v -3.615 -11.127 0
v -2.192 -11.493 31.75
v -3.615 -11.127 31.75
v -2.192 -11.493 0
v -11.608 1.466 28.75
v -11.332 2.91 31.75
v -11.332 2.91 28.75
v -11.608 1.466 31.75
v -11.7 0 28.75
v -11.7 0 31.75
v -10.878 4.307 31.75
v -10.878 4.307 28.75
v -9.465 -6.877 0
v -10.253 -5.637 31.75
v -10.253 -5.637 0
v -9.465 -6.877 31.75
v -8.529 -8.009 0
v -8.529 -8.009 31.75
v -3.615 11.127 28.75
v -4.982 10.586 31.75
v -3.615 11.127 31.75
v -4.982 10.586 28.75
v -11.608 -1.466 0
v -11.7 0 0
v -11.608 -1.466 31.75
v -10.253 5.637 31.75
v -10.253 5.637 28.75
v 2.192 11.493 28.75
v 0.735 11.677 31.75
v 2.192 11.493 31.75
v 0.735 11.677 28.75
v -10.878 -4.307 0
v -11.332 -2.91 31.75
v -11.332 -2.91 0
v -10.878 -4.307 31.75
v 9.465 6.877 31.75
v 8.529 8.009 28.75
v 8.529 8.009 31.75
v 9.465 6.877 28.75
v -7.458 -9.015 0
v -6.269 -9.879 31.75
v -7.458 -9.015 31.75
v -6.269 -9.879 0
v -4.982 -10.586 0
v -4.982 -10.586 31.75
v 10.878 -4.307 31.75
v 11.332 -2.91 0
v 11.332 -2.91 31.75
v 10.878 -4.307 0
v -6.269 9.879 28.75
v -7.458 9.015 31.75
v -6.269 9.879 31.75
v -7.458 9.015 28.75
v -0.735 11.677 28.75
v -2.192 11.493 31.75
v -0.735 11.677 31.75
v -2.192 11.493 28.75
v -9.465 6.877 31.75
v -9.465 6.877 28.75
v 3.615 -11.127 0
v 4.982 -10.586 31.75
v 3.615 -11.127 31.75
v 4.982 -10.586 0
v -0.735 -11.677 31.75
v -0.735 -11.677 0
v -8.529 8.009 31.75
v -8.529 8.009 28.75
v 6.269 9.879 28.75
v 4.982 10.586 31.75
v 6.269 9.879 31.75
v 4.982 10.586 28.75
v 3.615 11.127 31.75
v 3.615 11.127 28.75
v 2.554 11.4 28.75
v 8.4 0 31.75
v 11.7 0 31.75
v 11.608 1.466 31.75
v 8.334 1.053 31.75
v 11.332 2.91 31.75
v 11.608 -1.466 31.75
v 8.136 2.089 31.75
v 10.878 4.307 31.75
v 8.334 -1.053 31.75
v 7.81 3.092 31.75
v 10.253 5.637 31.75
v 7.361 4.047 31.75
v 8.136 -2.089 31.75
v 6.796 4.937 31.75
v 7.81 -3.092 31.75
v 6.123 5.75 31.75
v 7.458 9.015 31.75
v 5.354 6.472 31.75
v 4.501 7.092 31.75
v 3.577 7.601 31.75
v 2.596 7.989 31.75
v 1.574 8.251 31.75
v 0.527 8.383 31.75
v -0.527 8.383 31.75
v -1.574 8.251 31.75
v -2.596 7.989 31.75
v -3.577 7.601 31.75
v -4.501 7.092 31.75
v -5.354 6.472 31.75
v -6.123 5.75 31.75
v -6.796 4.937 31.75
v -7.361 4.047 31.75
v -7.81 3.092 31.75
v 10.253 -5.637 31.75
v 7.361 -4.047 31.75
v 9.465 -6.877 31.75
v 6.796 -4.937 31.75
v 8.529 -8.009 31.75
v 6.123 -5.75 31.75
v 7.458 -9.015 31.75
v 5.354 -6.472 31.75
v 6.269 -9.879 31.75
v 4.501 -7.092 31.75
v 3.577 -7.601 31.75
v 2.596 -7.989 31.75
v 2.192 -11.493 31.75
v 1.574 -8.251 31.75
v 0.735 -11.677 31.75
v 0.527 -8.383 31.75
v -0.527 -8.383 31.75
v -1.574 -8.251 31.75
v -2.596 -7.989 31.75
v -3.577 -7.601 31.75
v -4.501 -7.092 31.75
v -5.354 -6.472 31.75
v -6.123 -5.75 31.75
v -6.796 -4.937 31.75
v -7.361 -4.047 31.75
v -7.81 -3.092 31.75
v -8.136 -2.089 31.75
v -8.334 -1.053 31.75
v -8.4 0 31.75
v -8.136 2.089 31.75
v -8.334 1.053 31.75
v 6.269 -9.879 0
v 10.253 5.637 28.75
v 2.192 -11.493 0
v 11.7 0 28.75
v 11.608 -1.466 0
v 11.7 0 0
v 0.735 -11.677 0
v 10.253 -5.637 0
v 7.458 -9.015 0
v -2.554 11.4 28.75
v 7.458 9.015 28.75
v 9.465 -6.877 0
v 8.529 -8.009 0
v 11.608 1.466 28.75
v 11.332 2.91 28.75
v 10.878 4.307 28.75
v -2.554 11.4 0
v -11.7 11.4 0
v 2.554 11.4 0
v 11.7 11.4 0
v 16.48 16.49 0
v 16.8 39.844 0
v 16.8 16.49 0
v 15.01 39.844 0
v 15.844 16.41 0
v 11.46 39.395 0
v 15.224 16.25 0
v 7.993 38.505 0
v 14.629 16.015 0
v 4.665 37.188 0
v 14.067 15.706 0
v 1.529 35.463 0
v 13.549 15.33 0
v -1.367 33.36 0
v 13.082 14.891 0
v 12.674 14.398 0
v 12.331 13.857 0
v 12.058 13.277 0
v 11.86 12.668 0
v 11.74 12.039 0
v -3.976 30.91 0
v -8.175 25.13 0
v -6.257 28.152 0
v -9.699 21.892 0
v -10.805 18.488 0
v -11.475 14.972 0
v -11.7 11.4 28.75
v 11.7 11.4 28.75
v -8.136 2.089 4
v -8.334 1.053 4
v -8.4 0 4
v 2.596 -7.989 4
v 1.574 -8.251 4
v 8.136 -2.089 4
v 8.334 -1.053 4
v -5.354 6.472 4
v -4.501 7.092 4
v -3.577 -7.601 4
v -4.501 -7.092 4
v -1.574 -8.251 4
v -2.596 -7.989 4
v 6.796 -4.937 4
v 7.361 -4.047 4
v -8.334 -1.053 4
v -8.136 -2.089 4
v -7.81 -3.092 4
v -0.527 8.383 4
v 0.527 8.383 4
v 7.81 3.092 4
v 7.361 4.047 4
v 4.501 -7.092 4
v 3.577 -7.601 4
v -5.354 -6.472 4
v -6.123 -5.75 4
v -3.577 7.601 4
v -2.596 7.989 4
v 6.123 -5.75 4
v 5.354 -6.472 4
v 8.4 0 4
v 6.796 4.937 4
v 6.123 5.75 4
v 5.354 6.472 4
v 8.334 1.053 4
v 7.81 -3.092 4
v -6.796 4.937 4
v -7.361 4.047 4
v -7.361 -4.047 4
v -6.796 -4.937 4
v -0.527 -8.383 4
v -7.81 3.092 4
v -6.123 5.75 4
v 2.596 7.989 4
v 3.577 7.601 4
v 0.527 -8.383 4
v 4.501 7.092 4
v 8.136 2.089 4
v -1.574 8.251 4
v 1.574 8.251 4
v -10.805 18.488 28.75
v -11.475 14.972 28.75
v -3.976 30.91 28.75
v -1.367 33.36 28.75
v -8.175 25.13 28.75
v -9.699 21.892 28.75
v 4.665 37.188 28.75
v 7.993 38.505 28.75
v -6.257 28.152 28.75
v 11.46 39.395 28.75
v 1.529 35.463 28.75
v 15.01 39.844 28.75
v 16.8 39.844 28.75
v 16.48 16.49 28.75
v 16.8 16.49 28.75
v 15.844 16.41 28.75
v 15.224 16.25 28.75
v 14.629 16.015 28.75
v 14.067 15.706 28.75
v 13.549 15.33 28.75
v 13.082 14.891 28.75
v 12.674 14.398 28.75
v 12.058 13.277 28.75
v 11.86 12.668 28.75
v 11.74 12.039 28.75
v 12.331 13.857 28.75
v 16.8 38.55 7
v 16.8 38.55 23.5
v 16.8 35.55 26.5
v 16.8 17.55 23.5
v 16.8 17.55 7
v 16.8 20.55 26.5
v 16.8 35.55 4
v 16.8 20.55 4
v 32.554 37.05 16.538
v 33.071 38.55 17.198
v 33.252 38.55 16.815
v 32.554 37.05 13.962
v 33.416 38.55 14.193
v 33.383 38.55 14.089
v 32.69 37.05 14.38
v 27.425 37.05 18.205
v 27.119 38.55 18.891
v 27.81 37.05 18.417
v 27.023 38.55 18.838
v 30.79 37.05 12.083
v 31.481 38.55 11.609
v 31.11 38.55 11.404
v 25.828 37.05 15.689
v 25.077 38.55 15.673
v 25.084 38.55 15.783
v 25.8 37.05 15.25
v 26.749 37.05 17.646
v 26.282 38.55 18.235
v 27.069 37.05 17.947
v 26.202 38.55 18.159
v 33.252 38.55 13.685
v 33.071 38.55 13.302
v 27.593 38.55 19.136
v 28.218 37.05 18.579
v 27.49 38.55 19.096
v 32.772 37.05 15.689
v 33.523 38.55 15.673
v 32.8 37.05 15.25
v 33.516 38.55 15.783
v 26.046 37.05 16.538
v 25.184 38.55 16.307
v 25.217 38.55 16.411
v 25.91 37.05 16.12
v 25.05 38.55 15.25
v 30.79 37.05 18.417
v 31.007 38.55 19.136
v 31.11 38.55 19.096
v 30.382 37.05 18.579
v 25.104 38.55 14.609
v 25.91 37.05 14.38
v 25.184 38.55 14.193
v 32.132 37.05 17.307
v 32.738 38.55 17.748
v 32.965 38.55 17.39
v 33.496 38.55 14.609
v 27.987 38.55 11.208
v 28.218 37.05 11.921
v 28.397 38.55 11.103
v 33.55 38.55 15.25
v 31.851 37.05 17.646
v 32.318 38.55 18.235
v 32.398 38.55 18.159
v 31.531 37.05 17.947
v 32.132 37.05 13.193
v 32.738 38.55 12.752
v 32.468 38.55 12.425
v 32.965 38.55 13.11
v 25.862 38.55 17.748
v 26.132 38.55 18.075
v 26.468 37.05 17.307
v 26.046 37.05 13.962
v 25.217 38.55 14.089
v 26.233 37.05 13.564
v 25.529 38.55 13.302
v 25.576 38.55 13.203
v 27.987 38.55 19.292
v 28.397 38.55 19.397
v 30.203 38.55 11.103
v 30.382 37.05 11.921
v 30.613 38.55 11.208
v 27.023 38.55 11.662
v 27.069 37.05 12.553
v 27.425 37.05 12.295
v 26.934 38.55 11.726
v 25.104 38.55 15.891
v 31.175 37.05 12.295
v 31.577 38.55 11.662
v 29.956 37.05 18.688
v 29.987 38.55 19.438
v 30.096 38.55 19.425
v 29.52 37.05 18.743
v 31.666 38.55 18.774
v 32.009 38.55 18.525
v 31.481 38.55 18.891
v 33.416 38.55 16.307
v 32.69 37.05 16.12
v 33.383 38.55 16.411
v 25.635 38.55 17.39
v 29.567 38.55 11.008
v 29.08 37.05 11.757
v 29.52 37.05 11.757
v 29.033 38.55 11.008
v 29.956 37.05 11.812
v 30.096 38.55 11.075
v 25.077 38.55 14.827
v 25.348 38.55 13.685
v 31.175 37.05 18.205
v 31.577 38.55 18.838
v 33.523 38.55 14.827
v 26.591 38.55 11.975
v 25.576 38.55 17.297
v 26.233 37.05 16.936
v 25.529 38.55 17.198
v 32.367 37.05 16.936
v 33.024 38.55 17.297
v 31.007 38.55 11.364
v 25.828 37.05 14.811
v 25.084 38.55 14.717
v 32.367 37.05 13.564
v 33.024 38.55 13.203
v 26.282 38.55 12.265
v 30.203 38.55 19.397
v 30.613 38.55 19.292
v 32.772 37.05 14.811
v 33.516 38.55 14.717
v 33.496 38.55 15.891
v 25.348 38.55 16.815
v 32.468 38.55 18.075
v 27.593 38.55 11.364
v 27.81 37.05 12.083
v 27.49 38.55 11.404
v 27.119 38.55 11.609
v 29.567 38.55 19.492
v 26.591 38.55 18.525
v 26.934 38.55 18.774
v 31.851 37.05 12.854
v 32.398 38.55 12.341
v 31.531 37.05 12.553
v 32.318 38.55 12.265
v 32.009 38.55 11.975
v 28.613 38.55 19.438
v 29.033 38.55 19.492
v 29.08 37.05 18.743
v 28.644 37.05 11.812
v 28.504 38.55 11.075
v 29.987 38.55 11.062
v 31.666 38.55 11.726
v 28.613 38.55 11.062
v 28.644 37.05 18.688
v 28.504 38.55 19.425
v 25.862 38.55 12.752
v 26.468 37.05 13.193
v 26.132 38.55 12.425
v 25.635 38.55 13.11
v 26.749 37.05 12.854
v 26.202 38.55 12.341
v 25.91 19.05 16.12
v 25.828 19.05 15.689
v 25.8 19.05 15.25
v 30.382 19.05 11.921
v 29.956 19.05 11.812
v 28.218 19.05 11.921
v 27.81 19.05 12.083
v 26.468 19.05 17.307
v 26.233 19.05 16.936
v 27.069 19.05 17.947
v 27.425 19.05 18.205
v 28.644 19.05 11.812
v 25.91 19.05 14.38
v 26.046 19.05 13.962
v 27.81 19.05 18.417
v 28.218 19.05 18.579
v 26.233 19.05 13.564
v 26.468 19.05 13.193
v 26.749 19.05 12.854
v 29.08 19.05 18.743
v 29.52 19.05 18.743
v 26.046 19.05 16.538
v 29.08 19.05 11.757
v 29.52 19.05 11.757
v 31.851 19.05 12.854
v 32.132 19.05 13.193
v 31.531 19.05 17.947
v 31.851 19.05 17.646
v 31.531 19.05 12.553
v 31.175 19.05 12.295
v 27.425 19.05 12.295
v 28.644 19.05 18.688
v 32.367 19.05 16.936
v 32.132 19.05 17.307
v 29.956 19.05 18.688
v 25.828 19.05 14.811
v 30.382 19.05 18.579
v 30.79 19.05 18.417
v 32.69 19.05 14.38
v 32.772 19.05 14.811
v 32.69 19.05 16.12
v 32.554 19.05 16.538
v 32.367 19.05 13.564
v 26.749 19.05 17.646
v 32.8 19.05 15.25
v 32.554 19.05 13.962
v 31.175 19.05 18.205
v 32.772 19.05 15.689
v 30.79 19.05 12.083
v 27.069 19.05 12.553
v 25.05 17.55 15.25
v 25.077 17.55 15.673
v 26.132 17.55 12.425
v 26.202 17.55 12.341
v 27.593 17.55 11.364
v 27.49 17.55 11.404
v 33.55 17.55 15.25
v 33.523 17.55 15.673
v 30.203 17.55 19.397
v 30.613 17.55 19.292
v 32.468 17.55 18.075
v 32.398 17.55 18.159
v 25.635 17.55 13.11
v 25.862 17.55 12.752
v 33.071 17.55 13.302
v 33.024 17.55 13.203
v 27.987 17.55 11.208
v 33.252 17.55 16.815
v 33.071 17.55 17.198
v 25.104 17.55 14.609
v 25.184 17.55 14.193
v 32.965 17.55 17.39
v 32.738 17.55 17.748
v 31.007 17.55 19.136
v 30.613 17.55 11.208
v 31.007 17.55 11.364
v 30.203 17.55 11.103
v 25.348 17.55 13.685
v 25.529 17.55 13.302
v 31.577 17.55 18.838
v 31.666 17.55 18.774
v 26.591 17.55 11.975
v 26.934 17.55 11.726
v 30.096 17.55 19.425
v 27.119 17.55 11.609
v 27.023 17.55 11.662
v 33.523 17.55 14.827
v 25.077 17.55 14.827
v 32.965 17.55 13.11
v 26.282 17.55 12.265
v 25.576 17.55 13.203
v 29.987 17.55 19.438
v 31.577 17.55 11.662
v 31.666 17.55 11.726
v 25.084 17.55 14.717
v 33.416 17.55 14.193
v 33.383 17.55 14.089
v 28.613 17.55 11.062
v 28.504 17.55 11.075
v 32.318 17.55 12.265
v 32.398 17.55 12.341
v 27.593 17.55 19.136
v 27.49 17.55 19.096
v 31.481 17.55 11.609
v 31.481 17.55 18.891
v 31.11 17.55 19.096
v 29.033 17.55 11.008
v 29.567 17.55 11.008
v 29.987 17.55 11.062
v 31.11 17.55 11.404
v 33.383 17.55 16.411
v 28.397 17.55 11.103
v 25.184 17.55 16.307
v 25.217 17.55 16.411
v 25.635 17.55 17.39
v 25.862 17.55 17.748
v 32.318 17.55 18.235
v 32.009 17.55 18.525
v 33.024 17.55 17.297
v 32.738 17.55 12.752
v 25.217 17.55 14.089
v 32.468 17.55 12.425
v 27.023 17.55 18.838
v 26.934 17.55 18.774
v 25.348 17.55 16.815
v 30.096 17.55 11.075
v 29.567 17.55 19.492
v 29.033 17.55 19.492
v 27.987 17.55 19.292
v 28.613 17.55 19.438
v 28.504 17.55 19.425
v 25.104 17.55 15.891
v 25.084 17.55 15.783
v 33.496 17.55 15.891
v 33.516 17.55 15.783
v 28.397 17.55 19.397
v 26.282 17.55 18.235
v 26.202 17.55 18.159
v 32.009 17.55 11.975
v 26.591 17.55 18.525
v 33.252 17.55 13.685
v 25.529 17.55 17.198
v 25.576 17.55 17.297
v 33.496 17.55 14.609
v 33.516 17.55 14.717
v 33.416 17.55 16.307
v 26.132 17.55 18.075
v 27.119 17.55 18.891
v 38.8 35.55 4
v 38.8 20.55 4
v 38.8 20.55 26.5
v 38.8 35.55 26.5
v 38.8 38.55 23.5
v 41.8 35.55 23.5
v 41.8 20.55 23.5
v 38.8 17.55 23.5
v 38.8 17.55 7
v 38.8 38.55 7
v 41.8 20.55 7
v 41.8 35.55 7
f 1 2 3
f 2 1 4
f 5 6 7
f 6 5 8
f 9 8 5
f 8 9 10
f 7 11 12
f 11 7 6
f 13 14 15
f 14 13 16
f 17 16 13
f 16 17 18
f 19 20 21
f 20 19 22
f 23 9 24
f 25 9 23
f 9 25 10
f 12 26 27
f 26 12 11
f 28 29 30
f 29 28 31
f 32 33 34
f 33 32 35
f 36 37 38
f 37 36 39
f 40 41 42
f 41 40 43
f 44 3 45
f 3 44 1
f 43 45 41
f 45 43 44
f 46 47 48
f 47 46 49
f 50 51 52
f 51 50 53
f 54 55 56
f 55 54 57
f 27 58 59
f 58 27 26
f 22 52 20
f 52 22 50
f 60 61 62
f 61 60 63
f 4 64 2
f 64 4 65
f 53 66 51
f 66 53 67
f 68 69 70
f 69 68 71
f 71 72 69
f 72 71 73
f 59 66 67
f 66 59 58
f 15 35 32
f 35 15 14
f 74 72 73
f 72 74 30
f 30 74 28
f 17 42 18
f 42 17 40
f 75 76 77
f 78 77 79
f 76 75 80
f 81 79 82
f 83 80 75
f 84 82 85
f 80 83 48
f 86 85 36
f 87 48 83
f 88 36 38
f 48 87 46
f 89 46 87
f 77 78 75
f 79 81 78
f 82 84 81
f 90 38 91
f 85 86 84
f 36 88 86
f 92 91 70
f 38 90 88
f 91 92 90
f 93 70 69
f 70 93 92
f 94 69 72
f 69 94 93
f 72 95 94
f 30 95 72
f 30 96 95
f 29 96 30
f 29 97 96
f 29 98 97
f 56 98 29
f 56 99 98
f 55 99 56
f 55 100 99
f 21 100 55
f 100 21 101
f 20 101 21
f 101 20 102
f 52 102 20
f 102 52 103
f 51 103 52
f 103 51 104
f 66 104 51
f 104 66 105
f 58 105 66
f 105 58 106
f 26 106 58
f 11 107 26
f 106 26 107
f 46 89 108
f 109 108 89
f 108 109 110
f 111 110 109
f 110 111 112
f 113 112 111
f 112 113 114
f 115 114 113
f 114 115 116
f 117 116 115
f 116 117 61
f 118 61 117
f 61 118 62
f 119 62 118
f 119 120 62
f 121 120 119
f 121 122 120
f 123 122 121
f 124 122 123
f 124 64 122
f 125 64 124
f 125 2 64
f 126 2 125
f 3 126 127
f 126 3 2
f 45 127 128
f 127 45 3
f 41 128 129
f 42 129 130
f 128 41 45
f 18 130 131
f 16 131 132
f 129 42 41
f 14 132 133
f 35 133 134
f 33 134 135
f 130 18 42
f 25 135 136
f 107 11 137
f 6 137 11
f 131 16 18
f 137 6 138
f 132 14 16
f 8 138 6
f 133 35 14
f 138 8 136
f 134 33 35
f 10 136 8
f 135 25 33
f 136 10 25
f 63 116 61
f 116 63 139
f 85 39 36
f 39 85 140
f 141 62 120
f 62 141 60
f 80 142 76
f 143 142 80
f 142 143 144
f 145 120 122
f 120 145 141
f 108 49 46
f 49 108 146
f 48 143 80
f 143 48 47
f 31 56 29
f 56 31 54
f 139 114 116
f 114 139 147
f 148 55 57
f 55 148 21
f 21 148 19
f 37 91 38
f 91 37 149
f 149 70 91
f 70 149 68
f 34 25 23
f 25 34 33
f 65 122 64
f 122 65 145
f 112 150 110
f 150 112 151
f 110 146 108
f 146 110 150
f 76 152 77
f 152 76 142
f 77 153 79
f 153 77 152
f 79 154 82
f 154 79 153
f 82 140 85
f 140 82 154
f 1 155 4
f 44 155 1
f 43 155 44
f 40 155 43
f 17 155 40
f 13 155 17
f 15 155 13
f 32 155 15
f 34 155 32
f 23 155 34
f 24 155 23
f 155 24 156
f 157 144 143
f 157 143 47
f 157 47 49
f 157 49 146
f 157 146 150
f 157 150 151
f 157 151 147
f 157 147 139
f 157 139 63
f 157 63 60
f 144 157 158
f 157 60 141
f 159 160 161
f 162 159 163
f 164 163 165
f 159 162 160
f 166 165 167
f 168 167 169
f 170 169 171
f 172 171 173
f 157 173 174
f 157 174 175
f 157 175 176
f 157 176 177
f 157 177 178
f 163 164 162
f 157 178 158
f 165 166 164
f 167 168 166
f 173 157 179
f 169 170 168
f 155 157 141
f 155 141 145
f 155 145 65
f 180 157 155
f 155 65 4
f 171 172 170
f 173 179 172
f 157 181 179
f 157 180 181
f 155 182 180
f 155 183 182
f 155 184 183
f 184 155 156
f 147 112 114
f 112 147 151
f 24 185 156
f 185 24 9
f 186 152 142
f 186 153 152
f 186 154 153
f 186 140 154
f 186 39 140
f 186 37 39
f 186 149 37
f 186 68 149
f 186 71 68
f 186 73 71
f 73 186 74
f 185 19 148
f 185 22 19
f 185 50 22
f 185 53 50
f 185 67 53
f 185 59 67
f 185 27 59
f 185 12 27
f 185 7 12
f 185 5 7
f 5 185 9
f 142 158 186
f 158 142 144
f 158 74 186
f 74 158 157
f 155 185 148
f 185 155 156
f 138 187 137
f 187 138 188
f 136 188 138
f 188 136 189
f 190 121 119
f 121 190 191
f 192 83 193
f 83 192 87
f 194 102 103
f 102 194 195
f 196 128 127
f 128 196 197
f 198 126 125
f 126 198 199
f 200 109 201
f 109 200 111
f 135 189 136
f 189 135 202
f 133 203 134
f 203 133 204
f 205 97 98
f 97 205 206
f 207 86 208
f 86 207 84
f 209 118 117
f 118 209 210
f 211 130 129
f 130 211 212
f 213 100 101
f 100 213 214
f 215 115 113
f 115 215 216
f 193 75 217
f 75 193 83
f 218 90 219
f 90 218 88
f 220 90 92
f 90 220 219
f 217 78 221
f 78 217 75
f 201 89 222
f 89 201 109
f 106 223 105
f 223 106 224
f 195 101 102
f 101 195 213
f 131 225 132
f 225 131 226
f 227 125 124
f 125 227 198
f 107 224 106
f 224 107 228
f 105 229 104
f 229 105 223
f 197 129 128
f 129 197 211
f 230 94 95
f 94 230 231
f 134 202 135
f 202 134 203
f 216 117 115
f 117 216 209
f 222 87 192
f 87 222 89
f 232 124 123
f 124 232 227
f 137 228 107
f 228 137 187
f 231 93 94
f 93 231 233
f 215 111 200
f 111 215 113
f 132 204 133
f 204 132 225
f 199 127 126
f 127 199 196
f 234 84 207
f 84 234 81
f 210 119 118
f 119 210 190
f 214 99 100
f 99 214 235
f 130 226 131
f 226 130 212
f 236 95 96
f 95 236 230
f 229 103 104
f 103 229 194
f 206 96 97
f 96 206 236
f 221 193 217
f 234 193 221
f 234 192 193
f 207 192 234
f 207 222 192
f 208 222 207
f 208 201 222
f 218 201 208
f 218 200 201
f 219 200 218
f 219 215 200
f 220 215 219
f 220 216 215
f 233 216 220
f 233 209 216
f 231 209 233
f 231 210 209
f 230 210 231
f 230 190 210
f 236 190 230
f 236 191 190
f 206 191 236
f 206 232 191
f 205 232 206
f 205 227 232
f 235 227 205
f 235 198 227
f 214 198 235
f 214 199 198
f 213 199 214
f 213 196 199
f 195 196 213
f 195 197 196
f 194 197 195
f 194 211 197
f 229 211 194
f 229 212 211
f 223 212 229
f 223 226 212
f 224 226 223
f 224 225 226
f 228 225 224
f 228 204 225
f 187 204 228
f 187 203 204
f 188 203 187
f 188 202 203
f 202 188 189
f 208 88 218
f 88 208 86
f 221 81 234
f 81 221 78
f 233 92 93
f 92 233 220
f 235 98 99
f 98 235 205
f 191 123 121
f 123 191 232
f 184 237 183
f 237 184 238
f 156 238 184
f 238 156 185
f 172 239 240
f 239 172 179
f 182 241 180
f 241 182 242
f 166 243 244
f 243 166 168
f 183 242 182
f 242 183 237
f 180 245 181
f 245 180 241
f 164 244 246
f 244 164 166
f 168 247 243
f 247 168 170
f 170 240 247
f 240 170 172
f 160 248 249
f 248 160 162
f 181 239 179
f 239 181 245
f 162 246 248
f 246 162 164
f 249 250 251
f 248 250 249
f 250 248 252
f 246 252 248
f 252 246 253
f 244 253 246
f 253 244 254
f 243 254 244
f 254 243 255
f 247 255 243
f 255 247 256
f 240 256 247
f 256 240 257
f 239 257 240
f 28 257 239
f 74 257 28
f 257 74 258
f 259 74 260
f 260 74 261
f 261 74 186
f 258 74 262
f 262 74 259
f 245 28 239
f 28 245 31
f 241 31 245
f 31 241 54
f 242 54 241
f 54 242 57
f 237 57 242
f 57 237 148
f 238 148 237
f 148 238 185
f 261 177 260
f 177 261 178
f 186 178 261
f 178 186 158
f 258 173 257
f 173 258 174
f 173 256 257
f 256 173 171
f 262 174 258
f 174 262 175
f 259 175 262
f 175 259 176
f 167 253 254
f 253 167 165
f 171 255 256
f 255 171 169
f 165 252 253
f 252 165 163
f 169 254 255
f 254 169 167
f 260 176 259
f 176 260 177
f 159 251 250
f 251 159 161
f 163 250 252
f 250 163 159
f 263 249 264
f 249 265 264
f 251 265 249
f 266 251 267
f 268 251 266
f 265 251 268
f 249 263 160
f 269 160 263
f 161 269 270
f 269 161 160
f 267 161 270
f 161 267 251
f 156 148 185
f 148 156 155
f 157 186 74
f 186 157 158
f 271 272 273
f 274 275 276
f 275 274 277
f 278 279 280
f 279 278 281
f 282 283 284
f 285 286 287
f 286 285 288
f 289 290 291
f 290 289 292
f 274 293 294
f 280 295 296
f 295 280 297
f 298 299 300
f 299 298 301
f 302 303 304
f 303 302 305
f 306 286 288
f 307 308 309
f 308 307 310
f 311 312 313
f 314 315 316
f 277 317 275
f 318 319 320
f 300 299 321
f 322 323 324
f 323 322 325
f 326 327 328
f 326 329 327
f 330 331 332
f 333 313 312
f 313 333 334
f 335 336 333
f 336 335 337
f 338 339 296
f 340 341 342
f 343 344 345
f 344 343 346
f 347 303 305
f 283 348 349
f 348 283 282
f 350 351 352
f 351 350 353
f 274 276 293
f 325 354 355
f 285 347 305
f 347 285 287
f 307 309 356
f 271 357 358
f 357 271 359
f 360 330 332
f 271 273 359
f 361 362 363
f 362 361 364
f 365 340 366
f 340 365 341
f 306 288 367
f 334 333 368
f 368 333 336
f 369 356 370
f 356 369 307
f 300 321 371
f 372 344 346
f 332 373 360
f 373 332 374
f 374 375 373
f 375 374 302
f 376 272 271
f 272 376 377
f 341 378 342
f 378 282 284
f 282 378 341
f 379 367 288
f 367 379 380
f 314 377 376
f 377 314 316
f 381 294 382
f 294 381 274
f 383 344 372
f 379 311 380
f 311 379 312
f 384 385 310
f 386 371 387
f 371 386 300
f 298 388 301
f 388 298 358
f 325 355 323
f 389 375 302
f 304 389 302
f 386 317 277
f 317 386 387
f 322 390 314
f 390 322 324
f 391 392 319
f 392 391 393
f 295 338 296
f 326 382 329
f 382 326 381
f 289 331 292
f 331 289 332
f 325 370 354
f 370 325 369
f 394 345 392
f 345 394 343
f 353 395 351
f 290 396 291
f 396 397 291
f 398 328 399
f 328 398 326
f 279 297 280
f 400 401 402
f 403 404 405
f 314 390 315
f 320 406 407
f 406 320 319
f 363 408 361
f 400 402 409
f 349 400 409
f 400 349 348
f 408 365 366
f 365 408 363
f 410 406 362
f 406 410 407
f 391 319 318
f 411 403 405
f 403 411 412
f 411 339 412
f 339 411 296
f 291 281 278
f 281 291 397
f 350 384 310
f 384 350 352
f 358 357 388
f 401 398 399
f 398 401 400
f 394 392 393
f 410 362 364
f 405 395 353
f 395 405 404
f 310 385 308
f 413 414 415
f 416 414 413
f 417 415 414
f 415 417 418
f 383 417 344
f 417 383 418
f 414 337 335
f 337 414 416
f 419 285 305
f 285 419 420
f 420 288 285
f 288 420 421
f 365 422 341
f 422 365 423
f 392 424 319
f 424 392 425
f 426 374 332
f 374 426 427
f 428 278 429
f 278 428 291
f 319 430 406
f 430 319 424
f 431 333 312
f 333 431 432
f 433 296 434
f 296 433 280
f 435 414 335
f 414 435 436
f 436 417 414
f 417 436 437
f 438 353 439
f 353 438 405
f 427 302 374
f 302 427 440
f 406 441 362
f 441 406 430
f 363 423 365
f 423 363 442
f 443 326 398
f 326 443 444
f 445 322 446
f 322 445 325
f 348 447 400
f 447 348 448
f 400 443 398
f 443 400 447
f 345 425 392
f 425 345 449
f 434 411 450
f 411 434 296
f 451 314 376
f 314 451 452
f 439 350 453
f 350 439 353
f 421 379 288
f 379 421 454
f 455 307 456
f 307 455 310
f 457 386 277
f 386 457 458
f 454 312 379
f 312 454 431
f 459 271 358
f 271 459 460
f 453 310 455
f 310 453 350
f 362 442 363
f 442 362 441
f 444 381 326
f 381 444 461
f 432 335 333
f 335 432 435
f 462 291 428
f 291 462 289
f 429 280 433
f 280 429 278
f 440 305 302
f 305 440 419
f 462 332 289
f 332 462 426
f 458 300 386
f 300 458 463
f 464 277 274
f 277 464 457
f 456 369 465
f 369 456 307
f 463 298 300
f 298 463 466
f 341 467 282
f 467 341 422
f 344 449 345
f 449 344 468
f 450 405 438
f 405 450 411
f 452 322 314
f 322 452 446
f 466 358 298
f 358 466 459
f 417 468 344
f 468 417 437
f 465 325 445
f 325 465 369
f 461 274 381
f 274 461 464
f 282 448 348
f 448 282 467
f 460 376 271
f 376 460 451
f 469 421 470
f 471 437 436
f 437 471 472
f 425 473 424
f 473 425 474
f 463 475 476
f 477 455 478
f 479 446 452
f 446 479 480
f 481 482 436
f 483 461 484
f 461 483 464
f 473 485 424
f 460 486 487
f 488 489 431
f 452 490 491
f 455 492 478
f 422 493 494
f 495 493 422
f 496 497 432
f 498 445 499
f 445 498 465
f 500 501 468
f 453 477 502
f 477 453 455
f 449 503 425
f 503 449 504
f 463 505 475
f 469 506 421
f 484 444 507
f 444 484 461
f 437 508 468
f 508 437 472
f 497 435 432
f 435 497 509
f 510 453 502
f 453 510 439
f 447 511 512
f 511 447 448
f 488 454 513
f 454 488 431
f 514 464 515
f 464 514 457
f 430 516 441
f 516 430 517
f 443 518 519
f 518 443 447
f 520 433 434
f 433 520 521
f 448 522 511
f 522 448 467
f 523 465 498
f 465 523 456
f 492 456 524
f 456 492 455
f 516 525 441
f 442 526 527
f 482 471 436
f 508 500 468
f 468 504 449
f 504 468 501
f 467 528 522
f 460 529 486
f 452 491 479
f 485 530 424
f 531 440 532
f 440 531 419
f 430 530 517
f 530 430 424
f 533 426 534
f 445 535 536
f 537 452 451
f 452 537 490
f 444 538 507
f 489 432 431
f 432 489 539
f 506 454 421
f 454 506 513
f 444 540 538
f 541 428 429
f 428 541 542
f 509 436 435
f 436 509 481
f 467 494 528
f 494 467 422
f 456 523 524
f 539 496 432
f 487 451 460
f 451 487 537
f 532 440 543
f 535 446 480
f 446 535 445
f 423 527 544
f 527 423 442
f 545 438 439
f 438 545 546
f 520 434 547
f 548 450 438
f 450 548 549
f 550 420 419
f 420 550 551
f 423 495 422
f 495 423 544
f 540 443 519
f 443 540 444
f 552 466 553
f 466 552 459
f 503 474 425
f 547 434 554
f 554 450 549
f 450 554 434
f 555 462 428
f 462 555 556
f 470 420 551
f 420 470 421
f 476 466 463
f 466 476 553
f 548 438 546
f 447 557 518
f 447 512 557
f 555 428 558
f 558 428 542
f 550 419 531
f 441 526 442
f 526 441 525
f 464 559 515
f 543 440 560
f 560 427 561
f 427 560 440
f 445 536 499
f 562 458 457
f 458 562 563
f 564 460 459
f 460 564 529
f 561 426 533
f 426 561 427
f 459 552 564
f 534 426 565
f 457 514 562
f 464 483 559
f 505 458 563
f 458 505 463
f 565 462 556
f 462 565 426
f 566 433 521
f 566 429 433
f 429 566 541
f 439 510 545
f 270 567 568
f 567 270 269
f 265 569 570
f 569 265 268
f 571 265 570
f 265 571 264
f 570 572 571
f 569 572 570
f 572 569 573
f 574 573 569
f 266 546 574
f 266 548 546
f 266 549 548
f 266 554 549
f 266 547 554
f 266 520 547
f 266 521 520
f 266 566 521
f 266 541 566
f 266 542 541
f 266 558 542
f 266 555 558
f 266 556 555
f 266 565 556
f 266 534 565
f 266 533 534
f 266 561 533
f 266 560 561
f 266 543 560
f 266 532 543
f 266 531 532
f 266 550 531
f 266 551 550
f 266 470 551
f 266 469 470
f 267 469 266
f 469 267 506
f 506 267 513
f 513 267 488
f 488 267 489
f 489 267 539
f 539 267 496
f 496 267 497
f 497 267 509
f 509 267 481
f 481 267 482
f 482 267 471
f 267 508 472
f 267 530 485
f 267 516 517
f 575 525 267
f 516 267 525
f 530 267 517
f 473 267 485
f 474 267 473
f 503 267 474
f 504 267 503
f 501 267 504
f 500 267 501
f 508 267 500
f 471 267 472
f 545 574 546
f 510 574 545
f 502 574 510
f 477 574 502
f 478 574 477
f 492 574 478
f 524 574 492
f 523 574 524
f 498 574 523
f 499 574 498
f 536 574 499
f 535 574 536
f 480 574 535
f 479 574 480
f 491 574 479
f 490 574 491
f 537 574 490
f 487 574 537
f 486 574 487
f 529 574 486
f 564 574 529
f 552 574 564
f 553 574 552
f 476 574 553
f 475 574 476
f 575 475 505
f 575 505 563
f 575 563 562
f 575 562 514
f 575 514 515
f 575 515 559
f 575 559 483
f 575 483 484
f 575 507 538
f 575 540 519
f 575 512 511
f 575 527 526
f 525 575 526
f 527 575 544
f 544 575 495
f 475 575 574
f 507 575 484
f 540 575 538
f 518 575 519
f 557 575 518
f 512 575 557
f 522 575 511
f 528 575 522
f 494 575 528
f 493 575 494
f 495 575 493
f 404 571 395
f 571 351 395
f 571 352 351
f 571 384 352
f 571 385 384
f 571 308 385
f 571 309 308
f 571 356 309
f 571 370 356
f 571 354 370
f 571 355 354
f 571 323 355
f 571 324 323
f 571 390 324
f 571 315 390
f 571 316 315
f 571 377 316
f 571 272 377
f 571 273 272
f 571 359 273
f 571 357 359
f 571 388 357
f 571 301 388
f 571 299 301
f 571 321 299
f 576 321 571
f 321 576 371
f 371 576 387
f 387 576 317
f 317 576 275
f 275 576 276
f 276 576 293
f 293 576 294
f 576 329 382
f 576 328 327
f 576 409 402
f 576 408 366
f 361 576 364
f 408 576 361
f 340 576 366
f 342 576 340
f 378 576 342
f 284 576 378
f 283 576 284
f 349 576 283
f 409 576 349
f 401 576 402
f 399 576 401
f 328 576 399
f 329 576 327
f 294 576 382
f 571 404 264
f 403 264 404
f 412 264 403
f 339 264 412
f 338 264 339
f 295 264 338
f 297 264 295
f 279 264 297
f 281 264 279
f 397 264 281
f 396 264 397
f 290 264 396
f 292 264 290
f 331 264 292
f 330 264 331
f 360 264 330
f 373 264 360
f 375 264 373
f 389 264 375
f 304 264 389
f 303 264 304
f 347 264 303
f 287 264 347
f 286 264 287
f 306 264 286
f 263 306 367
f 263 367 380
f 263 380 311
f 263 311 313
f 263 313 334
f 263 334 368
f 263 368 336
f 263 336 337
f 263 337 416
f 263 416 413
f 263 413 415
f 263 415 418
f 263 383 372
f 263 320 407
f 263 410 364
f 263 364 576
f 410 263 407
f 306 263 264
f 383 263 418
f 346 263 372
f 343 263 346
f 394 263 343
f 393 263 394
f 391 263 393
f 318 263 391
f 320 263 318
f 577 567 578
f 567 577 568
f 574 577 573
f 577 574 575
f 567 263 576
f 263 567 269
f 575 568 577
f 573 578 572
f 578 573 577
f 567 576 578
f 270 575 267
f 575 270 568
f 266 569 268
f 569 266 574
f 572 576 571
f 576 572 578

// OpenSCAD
include <BOSL/constants.scad>
use <BOSL/shapes.scad>

d_inner=16.8;
d_outer=23.4;
h_inner=28.75;
r_ankle=28.5;
r_ankle2=r_ankle-d_outer;
ty_ankle=51.6-r_ankle-d_outer/2;
tx_ankle=-d_outer/2-r_ankle2;

x_insert=25;
y_insert=21;
z_insert=22.5;
t_insert=r_ankle2+d_outer/2;

$fn=50;


module joint() {
    difference() {
        union() {
            cylinder(d=d_outer, h=h_inner+3);
            translate([-d_outer/2, 0]) cube([d_outer, ty_ankle, h_inner]);
        }
        translate([0,0,3+1]) cylinder(d=d_inner, h=h_inner+1);
 
    }
}



module ankle() {
    intersection() {
        difference() {
            cylinder(r=r_ankle, h=h_inner);
            translate([0,0,-1]) cylinder(r=r_ankle2, h=h_inner+2);
        }
        cube(h_inner);
    }
}

module insert() {
    translate([x_insert/2 ,y_insert/2, z_insert/2]) difference() {
        cuboid([x_insert,y_insert, z_insert], chamfer=3);
        rotate([90, 0, 0]) union() {
            hull() {
                translate([0,0, -y_insert/2-1]) cylinder(h=1, d=9, center=true);
                translate([0,0, -y_insert/2+1]) cylinder(h=1, d=7, center=true);
            }
            cylinder(h=y_insert+2, d=7, center=true);
            hull() {
                translate([0,0, y_insert/2+1]) cylinder(h=1, d=9, center=true);
                translate([0,0, y_insert/2-1]) cylinder(h=1, d=7, center=true);
            }
        }
    }
    translate([x_insert-1, y_insert/2, z_insert/2]) cuboid([10,y_insert, z_insert], chamfer=3);
}
    
module left() {
    joint();
    translate([tx_ankle, ty_ankle, 0]) ankle();
    translate([-(t_insert+x_insert), t_insert+0.75, 4]) insert();
}

module right() {
    mirror([1,0,0]) left();
}

//left();
right();
//insert();
